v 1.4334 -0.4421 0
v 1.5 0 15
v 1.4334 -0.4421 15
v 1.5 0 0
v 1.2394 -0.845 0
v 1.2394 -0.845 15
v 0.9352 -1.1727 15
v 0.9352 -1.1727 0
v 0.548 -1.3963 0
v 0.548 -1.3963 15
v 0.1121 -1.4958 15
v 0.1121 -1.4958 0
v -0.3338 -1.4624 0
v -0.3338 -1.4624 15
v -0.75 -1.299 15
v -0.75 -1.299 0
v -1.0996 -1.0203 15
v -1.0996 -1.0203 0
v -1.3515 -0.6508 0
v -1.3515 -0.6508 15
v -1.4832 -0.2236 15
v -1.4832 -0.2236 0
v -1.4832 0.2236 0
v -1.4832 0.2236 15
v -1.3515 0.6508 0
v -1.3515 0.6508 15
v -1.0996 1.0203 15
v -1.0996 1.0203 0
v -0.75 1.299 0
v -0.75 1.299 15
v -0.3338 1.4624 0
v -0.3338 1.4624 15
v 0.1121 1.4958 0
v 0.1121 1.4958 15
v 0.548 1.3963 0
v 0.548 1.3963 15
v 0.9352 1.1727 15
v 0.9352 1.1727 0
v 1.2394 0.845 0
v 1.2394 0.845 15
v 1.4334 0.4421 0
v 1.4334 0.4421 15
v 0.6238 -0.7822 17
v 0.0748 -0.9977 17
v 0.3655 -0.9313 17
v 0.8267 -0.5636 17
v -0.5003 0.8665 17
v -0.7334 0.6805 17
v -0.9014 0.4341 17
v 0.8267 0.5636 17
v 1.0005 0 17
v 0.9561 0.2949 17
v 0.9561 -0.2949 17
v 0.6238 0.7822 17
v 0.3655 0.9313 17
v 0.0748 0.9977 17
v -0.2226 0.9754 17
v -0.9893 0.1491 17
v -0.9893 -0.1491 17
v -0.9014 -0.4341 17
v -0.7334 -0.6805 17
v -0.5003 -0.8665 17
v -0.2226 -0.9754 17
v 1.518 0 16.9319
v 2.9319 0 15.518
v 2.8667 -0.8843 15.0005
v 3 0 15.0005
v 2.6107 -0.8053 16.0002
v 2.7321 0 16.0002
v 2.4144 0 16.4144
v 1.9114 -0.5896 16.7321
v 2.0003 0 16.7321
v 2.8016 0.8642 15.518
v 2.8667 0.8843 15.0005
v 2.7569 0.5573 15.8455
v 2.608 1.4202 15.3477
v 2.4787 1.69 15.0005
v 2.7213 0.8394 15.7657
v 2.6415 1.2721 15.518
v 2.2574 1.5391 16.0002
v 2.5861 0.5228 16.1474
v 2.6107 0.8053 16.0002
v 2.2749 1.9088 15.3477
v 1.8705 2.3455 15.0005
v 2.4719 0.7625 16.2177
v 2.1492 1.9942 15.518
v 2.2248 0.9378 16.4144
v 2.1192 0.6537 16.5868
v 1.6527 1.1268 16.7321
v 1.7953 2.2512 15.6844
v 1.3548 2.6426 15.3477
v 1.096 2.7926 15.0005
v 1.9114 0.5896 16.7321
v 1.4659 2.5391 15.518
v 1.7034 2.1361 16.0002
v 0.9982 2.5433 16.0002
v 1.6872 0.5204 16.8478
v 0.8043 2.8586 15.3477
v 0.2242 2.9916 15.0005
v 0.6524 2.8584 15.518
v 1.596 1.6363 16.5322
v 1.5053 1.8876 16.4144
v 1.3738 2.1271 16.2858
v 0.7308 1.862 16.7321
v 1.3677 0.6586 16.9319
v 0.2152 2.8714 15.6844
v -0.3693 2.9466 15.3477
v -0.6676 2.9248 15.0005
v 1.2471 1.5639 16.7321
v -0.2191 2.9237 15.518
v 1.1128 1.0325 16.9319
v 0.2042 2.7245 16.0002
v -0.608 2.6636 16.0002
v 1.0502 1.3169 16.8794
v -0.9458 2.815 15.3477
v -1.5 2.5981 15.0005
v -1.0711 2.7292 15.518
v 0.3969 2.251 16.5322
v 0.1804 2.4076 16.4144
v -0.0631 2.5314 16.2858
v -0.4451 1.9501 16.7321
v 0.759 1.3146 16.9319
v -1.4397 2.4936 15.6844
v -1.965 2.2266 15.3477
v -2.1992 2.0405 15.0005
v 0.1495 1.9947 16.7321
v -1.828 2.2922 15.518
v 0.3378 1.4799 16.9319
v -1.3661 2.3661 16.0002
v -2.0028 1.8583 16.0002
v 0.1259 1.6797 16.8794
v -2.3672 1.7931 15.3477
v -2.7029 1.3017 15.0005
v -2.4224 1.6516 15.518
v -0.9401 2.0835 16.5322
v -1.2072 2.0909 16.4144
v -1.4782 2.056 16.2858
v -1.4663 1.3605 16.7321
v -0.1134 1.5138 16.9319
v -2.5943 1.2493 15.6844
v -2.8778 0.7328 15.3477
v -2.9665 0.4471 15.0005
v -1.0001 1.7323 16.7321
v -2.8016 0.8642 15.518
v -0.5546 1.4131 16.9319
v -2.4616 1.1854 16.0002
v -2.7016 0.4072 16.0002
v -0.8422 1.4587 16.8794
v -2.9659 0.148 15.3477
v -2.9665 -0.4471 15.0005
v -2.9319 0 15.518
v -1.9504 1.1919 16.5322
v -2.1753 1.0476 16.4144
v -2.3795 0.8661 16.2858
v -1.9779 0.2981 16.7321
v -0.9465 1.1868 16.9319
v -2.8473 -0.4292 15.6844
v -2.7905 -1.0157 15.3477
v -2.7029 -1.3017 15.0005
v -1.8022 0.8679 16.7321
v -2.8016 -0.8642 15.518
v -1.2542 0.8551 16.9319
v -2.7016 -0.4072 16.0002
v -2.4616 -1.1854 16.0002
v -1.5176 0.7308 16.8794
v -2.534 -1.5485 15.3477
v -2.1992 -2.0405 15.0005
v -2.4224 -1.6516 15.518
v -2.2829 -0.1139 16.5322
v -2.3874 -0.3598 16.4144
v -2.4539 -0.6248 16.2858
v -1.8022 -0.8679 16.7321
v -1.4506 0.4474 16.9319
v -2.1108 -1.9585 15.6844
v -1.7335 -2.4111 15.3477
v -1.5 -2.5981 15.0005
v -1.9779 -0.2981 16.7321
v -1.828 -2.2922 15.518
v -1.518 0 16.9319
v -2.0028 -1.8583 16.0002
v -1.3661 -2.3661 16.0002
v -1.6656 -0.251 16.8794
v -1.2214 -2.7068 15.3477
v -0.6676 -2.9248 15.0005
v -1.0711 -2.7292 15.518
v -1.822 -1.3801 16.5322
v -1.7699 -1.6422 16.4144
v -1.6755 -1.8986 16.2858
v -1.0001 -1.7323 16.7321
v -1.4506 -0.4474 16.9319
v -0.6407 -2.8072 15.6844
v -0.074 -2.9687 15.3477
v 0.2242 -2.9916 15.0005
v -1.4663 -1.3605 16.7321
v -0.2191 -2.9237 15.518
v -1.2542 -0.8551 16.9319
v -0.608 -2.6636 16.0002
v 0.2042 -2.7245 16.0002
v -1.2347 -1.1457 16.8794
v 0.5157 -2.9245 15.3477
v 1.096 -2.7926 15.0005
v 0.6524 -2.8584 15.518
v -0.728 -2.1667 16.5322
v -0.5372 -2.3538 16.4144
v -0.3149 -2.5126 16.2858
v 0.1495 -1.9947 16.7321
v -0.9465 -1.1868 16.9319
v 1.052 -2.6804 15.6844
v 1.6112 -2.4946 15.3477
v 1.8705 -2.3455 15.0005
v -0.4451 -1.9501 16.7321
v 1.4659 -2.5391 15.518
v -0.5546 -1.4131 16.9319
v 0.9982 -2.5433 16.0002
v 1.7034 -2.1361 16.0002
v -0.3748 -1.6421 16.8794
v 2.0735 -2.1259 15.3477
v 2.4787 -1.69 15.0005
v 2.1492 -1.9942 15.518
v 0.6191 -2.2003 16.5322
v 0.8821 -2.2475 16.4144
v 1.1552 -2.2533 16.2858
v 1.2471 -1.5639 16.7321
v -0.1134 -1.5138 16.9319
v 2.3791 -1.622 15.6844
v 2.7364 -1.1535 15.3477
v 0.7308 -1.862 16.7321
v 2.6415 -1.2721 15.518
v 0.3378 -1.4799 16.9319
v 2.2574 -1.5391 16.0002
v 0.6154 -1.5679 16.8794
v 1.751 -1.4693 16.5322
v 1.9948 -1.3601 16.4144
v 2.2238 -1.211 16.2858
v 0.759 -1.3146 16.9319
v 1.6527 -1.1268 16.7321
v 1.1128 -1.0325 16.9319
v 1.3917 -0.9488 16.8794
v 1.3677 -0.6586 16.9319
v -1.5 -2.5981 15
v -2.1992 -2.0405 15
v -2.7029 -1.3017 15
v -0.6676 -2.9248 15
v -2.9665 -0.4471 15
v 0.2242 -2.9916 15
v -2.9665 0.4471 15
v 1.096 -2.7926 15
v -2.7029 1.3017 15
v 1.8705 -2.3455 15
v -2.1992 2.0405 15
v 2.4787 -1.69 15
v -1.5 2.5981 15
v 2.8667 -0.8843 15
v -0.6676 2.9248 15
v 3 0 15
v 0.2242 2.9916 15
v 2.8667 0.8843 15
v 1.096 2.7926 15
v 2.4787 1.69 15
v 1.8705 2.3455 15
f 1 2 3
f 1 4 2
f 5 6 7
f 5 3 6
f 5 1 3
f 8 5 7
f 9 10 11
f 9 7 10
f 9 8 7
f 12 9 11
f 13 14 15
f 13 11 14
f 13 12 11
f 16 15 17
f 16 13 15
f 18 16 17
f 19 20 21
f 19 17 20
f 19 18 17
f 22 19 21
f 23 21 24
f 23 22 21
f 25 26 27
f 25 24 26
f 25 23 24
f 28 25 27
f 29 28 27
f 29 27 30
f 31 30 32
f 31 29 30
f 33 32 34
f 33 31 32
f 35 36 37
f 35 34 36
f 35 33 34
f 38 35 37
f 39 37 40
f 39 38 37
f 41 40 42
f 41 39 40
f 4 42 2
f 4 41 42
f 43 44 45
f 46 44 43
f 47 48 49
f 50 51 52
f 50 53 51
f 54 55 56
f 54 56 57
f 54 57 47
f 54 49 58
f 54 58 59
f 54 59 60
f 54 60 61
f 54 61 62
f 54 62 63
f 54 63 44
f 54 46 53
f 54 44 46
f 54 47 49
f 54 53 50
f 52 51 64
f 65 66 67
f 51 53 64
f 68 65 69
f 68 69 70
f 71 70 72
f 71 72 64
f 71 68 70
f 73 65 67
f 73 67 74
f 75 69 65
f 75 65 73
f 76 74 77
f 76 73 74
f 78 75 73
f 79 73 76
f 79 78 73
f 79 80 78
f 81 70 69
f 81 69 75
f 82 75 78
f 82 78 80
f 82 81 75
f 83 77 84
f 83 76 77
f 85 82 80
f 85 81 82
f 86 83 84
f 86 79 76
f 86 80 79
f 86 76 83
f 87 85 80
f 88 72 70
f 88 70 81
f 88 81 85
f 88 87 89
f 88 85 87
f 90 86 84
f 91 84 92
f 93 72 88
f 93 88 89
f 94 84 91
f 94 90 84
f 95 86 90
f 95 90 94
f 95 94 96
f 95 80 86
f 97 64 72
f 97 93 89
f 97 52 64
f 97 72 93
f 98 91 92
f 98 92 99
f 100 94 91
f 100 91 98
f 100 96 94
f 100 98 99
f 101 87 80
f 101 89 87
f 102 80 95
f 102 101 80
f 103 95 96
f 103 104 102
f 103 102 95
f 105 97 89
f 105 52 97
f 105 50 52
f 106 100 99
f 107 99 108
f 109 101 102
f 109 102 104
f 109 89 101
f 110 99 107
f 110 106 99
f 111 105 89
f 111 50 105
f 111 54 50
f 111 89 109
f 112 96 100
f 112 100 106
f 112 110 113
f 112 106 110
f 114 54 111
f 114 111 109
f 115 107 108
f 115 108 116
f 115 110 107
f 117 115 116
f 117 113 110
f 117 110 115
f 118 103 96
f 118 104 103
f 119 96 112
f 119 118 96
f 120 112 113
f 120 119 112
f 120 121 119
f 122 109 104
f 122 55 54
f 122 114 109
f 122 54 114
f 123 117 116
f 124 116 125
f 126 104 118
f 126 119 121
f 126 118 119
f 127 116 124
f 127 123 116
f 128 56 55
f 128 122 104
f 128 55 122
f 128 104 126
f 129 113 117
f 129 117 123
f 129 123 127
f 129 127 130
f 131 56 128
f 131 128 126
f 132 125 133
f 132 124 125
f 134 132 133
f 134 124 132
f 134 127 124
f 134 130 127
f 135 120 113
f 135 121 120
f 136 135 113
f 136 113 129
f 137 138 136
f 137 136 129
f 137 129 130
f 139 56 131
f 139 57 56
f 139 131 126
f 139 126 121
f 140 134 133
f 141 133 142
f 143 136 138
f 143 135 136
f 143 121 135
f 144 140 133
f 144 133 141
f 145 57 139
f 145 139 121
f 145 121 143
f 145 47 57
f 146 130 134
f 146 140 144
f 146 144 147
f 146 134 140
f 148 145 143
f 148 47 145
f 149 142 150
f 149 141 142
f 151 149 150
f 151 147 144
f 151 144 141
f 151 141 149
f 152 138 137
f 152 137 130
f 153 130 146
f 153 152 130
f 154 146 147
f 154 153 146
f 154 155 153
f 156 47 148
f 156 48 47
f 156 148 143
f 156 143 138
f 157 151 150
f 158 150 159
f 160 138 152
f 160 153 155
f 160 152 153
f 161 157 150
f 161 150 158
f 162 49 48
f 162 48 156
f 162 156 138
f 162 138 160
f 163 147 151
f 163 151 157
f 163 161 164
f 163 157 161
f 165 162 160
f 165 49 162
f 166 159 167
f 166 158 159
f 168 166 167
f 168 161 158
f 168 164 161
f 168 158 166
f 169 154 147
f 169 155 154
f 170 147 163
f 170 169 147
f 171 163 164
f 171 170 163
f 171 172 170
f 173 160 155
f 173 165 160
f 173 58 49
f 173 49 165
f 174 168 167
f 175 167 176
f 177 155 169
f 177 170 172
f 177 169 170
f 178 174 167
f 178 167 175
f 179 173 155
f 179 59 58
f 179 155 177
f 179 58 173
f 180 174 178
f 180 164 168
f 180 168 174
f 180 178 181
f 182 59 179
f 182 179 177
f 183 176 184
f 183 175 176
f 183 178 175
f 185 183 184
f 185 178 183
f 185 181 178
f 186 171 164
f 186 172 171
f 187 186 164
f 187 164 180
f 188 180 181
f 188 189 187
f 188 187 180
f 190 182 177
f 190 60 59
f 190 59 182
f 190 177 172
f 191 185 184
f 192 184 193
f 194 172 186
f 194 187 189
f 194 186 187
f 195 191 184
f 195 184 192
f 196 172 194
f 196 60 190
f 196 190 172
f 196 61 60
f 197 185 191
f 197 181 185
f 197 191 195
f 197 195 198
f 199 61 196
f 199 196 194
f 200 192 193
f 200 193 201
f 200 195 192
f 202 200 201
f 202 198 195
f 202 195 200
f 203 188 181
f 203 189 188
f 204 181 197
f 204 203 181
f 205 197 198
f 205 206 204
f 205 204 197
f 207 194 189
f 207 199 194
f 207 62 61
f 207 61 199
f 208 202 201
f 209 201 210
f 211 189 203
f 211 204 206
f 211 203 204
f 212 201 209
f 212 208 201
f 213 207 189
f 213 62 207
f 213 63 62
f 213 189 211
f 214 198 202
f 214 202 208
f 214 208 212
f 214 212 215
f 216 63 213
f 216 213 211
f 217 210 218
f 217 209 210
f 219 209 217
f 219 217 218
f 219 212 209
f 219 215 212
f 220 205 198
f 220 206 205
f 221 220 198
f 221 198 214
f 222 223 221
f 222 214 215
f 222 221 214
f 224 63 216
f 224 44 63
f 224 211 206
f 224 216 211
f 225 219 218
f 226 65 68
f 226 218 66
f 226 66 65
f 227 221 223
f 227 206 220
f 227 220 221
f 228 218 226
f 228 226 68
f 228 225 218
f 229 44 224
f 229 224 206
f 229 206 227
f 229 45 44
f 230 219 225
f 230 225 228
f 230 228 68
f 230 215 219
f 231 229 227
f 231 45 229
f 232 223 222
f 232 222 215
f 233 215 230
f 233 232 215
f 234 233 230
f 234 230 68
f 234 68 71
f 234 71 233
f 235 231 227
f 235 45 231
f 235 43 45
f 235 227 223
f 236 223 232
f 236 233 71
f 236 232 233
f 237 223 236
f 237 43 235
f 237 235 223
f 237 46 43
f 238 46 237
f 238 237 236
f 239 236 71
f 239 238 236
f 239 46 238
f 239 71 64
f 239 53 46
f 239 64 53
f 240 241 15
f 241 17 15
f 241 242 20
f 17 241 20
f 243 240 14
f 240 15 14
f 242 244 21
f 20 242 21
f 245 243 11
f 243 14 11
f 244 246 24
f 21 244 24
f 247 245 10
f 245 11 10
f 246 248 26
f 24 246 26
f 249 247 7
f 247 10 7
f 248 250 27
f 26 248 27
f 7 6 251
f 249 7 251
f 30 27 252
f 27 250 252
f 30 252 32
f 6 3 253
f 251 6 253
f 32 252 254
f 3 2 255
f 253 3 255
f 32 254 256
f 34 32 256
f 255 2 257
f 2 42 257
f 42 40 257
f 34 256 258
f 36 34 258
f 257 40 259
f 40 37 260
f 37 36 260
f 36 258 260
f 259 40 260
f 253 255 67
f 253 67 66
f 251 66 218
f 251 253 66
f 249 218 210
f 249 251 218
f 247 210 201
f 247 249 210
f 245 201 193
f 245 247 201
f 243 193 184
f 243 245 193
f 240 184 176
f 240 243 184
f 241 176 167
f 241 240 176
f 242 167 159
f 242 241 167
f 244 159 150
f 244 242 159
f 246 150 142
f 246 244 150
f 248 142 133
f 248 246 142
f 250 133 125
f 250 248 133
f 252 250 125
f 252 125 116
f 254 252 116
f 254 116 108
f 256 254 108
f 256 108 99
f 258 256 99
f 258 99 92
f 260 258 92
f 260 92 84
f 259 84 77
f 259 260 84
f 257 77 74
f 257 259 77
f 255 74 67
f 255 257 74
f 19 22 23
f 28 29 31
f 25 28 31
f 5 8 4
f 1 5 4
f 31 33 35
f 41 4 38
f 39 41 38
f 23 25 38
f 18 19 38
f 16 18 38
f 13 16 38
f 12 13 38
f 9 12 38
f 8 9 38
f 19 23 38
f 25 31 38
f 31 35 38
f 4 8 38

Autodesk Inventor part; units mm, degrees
ref_plane "YZ Plane" through (0, 0, 0) normal (1, 0, 0) x (0, 1, 0)
ref_plane "XZ Plane" through (0, 0, 0) normal (0, 1, 0) x (-1, 0, 0)
ref_plane "XY Plane" through (0, 0, 0) normal (0, 0, 1) x (1, 0, 0)
sketch "スケッチ1" plane through (0, 0, 0) normal (0, 0, 1) x (1, 0, 0)
  circle A0 centre (0, 0) radius 1.5
  dimension "d0" = 3
extrude "押し出し1" add sketch "スケッチ1" along normal blind 15
sketch "スケッチ2" plane through (0, 0, 15) normal (0, 0, 1) x (1, 0, 0)
  circle A0 centre (0, 0) radius 1.5 projected
  circle A1 centre (0, 0) radius 3
  dimension "d3" = 6
extrude "押し出し2" add sketch "スケッチ2" along normal blind 2 contours A0 | A1
fillet "フィレット1" radius 2 1 edges at (-3, 0, 17)
properties part number "M3ボタンボルト15" material "鋼、高強度、低合金"
